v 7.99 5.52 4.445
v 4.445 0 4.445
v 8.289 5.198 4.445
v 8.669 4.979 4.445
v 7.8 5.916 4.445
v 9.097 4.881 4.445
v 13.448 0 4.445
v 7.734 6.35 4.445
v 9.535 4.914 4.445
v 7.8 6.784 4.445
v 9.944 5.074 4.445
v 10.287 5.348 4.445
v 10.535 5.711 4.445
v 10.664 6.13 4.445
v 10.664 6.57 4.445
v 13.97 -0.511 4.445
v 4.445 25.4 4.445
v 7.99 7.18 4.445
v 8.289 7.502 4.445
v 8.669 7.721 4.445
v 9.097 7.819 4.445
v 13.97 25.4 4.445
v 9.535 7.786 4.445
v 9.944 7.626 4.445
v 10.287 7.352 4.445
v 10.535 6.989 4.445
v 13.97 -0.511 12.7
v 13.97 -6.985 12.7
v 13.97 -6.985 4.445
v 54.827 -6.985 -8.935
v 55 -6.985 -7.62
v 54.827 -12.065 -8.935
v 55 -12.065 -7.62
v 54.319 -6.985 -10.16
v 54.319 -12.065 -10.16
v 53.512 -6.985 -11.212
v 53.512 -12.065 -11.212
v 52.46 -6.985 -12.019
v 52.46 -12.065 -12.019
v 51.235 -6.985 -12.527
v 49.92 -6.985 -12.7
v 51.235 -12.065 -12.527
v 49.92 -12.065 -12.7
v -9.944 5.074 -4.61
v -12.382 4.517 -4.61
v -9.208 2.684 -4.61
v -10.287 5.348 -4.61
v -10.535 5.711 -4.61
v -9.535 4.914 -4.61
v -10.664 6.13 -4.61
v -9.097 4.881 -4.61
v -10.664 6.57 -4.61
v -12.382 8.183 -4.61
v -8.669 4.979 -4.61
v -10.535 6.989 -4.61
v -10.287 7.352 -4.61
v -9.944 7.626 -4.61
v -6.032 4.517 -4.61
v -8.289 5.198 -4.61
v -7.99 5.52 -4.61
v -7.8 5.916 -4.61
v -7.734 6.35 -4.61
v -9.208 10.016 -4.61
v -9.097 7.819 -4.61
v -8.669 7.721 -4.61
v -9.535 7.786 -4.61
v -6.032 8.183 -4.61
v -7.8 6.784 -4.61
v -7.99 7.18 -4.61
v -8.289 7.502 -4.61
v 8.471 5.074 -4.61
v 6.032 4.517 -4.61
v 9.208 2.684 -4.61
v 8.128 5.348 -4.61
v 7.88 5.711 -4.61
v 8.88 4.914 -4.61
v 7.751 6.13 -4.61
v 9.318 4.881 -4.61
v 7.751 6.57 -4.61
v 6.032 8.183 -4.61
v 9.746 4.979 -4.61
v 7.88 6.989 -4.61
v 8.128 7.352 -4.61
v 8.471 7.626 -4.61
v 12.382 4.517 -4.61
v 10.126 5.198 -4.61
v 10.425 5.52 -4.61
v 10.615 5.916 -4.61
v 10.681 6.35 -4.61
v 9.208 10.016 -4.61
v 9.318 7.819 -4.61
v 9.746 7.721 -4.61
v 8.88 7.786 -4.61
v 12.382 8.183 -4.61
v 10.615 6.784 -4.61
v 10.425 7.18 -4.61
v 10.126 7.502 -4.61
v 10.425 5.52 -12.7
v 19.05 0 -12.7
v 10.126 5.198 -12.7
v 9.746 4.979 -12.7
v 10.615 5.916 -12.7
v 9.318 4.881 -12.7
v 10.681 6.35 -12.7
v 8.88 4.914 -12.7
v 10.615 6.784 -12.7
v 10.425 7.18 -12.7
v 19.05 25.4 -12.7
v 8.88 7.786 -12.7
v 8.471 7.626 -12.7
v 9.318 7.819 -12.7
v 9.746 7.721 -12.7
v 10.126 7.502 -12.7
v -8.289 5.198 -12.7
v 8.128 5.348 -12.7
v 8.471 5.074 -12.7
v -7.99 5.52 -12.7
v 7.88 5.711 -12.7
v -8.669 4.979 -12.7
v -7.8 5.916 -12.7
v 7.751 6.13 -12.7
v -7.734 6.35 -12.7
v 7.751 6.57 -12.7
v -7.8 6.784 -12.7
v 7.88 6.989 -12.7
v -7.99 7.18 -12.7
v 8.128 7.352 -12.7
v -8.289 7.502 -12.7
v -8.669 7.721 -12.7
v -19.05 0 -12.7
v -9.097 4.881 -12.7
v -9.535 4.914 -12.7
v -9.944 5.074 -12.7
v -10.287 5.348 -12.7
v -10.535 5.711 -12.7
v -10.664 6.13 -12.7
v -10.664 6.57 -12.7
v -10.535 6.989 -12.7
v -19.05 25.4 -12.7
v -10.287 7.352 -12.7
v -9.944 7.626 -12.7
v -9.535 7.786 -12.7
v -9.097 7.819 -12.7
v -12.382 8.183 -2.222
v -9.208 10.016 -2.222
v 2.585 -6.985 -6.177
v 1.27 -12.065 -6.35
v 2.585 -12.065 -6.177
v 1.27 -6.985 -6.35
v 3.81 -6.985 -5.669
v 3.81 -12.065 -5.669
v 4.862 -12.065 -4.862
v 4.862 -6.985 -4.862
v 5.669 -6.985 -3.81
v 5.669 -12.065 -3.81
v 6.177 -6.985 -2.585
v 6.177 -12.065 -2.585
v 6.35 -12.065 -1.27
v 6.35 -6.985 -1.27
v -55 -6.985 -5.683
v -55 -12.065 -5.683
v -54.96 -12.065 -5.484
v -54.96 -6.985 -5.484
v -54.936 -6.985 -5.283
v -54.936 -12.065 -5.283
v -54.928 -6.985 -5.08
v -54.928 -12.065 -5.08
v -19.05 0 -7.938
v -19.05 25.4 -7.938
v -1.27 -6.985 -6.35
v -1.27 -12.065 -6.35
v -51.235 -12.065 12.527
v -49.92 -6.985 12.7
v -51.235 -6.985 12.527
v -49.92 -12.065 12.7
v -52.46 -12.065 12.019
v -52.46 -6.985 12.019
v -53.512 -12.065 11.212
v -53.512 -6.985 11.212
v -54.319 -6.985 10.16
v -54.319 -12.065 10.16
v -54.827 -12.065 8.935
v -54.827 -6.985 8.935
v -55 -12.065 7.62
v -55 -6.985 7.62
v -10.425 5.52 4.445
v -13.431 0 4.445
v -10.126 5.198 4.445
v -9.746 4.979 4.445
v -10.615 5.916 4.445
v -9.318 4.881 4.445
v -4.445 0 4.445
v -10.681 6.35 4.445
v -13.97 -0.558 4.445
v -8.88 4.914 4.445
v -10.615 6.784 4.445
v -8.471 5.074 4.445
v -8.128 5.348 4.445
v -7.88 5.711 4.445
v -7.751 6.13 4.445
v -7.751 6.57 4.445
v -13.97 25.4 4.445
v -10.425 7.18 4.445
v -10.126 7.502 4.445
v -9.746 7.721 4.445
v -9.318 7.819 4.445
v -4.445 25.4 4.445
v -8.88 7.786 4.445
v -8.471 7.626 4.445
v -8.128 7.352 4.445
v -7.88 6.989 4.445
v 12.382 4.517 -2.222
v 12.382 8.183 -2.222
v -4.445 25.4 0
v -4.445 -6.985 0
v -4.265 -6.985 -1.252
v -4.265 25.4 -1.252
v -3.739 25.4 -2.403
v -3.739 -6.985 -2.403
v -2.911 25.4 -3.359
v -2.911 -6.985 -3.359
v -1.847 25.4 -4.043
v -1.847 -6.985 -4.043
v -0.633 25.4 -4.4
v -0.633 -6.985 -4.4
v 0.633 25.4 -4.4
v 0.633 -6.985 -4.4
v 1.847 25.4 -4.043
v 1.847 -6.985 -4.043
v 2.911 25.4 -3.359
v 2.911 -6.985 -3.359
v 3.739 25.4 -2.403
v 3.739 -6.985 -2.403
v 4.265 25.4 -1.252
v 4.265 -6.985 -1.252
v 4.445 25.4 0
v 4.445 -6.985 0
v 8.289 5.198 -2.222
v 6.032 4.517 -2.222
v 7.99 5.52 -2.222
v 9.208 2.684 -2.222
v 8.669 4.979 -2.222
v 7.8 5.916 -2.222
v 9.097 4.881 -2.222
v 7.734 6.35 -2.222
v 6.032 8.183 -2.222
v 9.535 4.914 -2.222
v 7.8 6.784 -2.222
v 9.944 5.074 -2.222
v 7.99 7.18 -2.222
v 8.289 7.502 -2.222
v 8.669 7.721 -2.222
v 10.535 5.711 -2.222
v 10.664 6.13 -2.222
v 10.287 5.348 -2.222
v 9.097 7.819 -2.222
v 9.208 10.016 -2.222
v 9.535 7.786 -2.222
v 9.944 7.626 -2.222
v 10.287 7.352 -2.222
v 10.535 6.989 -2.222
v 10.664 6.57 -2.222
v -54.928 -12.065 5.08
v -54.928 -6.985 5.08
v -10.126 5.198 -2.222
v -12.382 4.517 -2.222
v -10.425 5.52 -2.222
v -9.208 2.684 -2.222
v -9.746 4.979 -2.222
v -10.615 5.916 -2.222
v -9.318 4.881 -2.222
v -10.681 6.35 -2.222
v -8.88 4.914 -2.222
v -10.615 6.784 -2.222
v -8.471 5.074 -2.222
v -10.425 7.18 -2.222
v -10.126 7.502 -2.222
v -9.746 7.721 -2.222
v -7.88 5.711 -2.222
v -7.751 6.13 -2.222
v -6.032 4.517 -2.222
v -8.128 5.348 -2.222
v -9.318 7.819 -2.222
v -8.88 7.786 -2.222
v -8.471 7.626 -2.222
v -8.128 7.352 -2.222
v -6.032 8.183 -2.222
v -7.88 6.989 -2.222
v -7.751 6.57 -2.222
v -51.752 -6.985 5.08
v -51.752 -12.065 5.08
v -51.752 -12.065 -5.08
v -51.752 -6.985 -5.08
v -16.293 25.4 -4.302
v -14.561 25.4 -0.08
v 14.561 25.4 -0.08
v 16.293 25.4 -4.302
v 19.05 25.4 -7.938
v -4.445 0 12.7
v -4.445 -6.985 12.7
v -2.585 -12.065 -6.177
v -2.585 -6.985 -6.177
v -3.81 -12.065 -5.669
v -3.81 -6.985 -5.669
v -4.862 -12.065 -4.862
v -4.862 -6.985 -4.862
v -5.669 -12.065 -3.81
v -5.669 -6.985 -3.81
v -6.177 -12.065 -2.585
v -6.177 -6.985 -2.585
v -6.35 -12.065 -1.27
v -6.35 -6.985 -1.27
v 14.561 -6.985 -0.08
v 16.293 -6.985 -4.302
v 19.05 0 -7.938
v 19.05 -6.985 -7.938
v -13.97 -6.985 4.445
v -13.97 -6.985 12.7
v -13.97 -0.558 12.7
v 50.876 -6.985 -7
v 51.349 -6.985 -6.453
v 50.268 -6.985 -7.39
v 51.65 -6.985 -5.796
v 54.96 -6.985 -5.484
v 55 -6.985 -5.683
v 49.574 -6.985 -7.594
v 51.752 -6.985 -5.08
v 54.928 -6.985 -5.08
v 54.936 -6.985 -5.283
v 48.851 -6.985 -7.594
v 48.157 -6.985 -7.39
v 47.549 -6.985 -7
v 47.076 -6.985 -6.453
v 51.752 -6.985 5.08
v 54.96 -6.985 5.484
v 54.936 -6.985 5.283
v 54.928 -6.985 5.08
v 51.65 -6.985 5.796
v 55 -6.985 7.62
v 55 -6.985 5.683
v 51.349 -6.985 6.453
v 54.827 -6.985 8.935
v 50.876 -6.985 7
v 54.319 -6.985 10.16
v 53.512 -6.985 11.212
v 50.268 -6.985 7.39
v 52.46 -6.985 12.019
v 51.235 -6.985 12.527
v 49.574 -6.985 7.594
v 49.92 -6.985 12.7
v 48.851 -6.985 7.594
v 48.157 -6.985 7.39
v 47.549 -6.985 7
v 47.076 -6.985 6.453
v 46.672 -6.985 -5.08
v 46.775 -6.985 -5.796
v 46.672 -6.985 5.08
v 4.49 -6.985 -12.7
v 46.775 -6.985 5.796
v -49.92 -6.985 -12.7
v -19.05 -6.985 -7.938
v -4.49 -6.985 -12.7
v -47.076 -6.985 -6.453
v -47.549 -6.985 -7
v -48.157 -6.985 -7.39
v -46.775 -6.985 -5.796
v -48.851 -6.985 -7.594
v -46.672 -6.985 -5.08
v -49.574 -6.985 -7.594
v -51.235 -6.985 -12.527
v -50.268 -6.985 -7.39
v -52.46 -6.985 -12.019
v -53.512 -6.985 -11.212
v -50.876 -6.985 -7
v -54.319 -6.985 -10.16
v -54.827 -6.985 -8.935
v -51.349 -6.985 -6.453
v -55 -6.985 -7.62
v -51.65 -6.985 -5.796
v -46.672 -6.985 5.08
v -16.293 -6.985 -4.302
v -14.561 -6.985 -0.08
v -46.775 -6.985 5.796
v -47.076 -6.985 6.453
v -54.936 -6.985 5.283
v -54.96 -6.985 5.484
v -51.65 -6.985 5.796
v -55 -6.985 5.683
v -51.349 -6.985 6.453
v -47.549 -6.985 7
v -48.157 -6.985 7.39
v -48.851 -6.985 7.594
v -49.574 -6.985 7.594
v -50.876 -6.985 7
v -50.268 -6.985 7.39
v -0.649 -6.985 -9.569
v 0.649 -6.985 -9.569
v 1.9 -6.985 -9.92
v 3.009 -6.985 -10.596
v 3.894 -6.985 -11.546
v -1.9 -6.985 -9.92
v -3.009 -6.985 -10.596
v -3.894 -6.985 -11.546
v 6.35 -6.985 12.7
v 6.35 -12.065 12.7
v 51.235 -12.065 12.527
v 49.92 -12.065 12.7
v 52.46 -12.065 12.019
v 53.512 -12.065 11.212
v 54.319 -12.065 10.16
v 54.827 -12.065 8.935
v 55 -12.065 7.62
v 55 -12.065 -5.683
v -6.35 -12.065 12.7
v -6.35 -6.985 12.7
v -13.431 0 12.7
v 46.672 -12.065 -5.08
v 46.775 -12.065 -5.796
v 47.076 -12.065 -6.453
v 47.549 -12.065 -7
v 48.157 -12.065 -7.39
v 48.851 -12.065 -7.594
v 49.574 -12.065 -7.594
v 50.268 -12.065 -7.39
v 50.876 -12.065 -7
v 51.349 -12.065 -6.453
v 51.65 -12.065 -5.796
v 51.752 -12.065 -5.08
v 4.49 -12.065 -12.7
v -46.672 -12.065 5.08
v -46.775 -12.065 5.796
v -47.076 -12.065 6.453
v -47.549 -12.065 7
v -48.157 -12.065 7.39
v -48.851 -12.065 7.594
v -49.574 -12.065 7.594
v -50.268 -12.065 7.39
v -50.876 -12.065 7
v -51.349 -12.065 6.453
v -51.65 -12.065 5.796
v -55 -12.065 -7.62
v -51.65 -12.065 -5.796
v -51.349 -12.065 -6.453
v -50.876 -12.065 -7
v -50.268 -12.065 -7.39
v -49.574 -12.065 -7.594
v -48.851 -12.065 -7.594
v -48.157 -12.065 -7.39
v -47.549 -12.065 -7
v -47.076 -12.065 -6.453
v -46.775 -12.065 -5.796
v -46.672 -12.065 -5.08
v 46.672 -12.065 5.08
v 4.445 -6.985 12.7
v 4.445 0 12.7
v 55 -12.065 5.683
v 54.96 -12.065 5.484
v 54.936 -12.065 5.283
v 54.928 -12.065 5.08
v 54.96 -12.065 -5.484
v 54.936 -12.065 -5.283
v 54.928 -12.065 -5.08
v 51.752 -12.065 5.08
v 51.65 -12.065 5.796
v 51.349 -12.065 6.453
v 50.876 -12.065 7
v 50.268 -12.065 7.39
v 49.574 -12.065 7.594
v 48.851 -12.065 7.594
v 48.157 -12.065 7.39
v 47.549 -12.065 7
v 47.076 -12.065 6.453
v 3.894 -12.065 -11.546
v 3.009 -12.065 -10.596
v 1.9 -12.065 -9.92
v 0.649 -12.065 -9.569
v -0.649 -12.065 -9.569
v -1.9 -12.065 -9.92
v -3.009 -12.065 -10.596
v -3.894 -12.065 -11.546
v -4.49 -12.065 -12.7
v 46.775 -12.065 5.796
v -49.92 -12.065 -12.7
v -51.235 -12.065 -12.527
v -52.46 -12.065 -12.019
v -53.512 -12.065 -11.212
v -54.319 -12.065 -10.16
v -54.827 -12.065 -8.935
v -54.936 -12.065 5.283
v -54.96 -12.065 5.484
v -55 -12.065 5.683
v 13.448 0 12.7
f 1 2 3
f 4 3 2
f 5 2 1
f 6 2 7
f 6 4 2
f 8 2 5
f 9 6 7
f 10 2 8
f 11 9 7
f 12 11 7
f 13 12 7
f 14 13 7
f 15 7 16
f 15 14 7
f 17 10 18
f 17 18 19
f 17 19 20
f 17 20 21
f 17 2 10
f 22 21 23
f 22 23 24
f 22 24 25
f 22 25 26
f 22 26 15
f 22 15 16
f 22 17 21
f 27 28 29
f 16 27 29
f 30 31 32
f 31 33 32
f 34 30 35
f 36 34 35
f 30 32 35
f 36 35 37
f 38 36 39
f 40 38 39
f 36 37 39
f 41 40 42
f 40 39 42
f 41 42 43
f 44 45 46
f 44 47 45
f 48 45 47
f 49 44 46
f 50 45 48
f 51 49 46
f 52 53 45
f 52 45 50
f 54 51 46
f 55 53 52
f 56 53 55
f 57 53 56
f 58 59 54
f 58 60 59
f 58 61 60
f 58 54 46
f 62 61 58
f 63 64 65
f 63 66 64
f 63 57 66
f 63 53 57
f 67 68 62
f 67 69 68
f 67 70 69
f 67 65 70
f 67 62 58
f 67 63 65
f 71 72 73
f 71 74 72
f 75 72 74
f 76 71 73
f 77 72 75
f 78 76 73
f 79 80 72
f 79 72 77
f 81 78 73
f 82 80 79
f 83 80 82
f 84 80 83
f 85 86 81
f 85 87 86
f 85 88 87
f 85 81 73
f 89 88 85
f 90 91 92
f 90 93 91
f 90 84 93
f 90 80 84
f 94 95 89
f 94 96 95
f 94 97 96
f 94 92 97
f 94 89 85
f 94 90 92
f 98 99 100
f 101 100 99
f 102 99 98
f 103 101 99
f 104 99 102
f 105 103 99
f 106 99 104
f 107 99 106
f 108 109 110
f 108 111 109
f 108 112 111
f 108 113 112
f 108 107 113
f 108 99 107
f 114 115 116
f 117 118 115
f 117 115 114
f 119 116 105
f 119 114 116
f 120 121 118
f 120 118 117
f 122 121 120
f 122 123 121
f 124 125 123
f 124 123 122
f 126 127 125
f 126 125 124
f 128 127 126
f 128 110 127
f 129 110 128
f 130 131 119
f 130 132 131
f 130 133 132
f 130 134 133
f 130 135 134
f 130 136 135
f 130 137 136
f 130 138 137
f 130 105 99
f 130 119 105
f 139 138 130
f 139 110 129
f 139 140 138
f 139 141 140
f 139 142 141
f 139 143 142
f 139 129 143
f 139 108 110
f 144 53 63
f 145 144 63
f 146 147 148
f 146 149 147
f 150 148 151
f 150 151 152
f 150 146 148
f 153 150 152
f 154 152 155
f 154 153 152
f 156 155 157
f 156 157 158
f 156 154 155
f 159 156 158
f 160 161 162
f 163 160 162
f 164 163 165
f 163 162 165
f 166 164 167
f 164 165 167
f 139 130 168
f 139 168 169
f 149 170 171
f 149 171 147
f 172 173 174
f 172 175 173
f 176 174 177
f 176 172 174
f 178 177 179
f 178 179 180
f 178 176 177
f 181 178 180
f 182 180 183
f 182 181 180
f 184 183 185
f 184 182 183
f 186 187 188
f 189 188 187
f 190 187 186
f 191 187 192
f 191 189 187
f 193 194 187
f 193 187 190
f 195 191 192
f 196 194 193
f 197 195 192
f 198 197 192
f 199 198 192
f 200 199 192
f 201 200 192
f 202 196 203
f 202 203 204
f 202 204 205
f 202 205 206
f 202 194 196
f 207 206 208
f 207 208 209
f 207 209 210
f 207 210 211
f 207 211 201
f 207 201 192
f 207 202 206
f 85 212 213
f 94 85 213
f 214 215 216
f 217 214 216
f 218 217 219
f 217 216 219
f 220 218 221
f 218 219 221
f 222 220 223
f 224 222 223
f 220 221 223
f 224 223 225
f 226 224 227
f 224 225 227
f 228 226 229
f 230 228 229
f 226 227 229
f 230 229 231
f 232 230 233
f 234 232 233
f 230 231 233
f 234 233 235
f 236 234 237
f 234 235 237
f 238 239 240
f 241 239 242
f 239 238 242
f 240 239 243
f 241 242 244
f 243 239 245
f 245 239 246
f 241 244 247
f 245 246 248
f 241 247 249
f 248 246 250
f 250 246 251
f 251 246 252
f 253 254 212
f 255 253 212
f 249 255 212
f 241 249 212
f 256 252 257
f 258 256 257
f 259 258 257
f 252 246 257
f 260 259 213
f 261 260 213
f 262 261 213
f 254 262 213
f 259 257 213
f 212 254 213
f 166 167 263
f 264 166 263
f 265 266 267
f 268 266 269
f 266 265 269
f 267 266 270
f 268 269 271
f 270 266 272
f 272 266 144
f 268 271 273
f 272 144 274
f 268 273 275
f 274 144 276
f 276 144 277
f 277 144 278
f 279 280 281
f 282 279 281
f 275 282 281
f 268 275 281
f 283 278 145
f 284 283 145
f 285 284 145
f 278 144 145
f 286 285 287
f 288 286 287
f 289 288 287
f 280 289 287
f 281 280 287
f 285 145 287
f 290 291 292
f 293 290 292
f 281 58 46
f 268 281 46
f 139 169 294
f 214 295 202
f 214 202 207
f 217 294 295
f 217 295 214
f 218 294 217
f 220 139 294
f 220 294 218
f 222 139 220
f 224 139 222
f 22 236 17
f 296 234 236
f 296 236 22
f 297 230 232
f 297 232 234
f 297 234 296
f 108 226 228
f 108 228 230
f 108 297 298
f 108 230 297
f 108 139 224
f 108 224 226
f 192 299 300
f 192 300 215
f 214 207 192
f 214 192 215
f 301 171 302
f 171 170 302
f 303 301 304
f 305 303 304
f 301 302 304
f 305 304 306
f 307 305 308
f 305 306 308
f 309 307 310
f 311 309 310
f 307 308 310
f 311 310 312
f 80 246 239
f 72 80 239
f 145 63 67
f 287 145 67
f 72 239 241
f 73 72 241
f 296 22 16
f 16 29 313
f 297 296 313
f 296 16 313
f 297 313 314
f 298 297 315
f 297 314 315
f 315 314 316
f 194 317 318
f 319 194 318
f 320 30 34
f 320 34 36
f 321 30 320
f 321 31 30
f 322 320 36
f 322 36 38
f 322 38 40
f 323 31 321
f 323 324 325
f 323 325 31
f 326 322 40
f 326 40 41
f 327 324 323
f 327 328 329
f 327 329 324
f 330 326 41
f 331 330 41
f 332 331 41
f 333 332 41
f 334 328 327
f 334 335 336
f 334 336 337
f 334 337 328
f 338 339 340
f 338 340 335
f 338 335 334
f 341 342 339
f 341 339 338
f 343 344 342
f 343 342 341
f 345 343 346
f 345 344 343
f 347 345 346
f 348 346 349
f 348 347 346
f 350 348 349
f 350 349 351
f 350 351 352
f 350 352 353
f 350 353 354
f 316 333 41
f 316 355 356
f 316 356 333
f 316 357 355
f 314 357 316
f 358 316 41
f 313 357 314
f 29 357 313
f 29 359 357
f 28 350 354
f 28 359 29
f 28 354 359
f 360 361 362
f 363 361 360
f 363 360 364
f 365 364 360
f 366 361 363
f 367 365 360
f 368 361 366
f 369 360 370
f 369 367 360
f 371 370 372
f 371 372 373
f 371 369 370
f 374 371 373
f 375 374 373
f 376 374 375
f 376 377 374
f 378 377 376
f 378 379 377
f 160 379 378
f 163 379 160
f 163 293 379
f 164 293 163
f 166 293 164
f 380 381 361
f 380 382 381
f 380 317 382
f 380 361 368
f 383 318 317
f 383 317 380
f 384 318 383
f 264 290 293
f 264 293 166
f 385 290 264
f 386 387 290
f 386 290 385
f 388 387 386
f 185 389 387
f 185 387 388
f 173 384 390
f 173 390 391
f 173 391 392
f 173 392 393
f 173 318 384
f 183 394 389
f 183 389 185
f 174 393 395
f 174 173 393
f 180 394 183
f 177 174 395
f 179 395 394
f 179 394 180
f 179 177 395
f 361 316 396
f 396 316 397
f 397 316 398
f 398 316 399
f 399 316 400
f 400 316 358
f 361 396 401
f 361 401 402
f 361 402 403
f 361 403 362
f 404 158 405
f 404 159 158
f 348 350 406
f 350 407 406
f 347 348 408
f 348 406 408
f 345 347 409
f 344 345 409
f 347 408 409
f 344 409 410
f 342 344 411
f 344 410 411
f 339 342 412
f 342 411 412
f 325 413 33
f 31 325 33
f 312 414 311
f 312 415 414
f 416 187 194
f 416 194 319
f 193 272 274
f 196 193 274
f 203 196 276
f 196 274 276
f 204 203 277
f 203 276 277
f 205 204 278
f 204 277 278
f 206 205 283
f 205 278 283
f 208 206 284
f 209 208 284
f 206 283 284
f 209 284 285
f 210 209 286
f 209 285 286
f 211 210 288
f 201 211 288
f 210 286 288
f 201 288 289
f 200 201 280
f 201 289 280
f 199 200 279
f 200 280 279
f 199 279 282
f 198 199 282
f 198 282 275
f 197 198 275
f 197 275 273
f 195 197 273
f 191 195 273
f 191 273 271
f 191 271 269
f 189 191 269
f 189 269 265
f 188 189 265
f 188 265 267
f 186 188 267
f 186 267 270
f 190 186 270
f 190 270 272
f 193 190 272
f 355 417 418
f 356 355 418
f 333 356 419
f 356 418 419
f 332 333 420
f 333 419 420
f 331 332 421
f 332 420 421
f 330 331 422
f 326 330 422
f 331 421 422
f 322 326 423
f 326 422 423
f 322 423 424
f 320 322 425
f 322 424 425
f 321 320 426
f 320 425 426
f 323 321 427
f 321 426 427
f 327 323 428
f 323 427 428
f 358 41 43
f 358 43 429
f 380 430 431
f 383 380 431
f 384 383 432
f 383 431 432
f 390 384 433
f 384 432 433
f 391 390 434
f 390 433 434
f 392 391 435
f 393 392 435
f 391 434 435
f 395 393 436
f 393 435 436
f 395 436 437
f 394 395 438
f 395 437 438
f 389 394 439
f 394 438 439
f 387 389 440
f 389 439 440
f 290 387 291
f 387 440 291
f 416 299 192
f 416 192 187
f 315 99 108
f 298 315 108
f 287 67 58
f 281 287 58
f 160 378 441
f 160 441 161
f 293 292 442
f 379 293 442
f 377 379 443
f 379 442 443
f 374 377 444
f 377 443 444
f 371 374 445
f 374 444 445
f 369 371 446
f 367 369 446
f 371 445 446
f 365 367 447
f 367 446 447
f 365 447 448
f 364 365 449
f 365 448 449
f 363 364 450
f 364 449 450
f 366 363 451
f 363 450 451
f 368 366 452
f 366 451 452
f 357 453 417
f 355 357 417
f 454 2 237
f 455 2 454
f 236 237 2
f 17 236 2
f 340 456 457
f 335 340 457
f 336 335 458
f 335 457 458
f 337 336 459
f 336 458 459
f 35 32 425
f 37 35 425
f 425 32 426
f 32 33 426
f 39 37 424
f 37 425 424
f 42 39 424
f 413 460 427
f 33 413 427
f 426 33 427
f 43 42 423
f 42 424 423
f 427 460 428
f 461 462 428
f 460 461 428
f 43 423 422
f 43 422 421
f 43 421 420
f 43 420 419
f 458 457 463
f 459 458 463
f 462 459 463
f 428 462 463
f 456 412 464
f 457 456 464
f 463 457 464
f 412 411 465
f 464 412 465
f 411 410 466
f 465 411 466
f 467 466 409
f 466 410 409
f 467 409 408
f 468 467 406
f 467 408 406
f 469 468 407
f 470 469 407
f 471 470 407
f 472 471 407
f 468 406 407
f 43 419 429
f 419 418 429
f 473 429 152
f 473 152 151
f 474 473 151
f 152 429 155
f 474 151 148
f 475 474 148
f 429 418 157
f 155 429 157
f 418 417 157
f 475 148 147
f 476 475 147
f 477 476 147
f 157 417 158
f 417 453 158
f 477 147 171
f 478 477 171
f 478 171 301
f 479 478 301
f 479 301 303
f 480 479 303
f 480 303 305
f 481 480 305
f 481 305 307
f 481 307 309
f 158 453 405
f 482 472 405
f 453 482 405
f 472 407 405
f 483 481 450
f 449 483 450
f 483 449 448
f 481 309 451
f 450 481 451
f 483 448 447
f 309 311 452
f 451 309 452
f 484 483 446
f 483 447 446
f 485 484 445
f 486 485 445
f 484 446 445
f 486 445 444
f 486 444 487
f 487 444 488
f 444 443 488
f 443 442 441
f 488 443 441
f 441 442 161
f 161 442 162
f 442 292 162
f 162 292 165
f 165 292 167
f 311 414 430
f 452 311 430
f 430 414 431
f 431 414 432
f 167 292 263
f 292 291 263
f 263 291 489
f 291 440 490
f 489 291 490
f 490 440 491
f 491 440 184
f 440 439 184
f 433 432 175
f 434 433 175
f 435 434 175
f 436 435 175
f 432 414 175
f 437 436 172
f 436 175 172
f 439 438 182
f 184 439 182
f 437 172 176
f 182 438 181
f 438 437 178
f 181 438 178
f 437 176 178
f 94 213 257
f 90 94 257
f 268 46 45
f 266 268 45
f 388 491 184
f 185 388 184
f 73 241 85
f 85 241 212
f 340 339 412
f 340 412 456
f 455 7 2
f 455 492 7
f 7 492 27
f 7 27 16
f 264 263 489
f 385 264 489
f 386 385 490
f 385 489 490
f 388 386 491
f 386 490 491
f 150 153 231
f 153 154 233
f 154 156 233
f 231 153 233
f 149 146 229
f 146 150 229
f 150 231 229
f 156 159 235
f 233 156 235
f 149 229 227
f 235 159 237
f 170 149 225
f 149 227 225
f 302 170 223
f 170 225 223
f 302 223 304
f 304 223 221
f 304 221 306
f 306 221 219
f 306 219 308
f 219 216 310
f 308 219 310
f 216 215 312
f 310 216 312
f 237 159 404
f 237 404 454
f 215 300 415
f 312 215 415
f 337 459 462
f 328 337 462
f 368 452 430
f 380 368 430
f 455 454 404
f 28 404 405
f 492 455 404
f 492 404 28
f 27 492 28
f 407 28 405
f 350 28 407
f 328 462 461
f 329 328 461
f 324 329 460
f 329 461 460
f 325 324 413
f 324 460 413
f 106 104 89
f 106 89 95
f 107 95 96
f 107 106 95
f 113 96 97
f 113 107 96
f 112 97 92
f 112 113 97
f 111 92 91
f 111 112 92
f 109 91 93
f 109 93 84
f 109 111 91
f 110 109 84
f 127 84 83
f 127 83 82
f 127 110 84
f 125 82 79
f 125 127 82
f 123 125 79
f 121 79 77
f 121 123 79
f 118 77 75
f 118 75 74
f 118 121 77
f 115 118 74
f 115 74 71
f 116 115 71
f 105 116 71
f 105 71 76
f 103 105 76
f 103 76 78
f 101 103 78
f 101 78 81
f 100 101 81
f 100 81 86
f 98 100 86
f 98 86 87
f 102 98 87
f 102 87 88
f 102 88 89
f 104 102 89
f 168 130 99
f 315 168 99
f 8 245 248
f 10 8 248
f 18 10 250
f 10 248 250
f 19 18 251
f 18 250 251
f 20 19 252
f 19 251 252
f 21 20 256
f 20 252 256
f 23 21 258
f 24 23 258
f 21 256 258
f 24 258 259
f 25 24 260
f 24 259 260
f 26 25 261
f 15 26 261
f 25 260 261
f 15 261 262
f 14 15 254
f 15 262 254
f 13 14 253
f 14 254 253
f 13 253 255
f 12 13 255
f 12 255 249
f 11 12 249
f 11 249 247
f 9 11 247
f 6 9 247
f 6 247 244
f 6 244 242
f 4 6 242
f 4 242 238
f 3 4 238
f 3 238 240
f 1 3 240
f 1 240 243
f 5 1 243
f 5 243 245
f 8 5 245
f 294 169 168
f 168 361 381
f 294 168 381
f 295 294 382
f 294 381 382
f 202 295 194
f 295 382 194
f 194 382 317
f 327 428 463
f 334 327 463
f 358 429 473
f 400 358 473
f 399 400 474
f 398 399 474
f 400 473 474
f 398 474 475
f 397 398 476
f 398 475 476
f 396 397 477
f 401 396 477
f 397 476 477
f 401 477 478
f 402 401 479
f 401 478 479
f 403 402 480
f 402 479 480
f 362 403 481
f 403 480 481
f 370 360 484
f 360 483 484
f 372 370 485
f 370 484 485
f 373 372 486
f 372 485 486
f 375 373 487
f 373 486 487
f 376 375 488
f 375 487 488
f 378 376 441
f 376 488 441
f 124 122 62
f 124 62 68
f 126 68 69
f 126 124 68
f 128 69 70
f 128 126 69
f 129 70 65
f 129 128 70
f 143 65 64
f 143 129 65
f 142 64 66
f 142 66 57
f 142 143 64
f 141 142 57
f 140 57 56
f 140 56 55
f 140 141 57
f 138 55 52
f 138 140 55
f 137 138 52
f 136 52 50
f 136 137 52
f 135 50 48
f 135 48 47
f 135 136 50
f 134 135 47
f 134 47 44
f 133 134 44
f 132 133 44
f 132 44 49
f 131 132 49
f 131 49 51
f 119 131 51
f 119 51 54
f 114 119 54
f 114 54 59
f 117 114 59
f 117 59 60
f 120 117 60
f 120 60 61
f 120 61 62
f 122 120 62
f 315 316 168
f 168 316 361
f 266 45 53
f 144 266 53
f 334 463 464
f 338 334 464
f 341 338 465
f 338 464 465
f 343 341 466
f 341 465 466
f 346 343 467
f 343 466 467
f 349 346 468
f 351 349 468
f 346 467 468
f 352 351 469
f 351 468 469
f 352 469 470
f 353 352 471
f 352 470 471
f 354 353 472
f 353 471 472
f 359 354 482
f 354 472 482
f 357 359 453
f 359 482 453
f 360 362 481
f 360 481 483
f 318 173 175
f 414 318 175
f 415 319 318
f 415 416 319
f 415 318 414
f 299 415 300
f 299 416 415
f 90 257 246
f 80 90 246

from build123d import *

# Parameters (mm, degrees)
CUT_EXTRUDE1_START     = -18.415
CUT_EXTRUDE1_OUTLINE_W = 38.1
CUT_EXTRUDE1_OUTLINE_H = 25.4
CUT_EXTRUDE1_DEPTH     = 25.0825
CUT_EXTRUDE1_2_DEPTH   = 16.0274
CUT_EXTRUDE1_3_DEPTH   = 6.6675
CUT_EXTRUDE2_DEPTH     = 2.3876
CUT_EXTRUDE3_DEPTH     = 38.867781903
CUT_EXTRUDE4_DEPTH     = 38.867781903
CUT_EXTRUDE5_DEPTH     = 38.867781903
BOSS_EXTRUDE1_START    = 6.985
BOSS_EXTRUDE1_DEPTH    = 6.985
BOSS_EXTRUDE2_DEPTH    = 5.08
SKETCH8_W              = 19.05
SKETCH8_H              = 5.08
CUT_EXTRUDE6_DEPTH     = 1.905
SKETCH9_W              = 19.05
SKETCH9_H              = 5.08
CUT_EXTRUDE7_DEPTH     = 1.905
CUT_EXTRUDE8_REACH     = 71.674
CUT_EXTRUDE9_REACH     = 71.674
CUT_EXTRUDE10_REACH    = 71.674
CUT_EXTRUDE11_REACH    = 71.674
CUT_EXTRUDE12_REACH    = 71.674
SKETCH15_W             = 1.4732
SKETCH15_H             = 16.0274
SKETCH16_W             = 1.4732
SKETCH16_H             = 16.0274
M2_5_CLEARANCE_HOLE1_D = 2.9464
FILLET1_R              = 5.08
CHAMFER2_SIZE          = 0.511100582
CHAMFER2_SIZE2         = 0.522104304
CHAMFER3_SIZE          = 0.558247665
CHAMFER3_SIZE2         = 0.538663646
SKETCH27_W             = 38.1
SKETCH27_H             = 25.4
CUT_EXTRUDE13_DEPTH    = 7.9375


with BuildPart() as part:
    # Cut-Extrude1: read off the stored shape, not the designer's step
    # Cut-Extrude1 outline → Cut-Extrude1 (new body)
    with BuildSketch(Plane.XY.offset(-2.2225).offset(CUT_EXTRUDE1_START)):
        with Locations((0, 12.7)):
            Rectangle(CUT_EXTRUDE1_OUTLINE_W, CUT_EXTRUDE1_OUTLINE_H)
        Polygon((-6.0325, 8.183087105), (-6.0325, 4.516912895), (-9.2075, 2.683825791), (-12.3825, 4.516912895), (-12.3825, 8.183087105), (-9.2075, 10.016174209), align=None, mode=Mode.SUBTRACT)
    extrude(amount=CUT_EXTRUDE1_DEPTH)

    # Cut-Extrude1 2 outline → Cut-Extrude1 2 (add)
    with BuildSketch(Plane.XY.offset(-2.2225).offset(CUT_EXTRUDE1_START)):
        Polygon((-9.2075, 2.683825791), (-6.0325, 4.516912895), (-6.0325, 8.183087105), (-9.2075, 10.016174209), (-12.3825, 8.183087105), (-12.3825, 4.516912895), align=None)
    extrude(amount=CUT_EXTRUDE1_2_DEPTH)

    # Cut-Extrude1 3 outline → Cut-Extrude1 3 (add)
    with BuildSketch(Plane.XY.offset(-2.2225)):
        Polygon((-9.2075, 2.683825791), (-6.0325, 4.516912895), (-6.0325, 8.183087105), (-9.2075, 10.016174209), (-12.3825, 8.183087105), (-12.3825, 4.516912895), align=None)
    extrude(amount=CUT_EXTRUDE1_3_DEPTH)

    # Sketch2 → Cut-Extrude2 (cut)
    with BuildSketch(Plane.XY.offset(-2.2225)):
        Polygon((6.0325, 8.183087105), (6.0325, 4.516912895), (9.2075, 2.683825791), (12.3825, 4.516912895), (12.3825, 8.183087105), (9.2075, 10.016174209), align=None)
    extrude(amount=-CUT_EXTRUDE2_DEPTH, mode=Mode.SUBTRACT)

    # Sketch3 → Cut-Extrude3 (cut, through all)
    with BuildSketch(Plane.XZ):
        with BuildLine():
            Line((-13.97, 4.445), (-19.05, 4.445))
            Line((-19.05, 4.445), (-19.05, -7.9375))
            ThreePointArc((-19.05, -7.9375), (-15.289364951, -2.247023353), (-13.97, 4.445))
        make_face()
    extrude(amount=-CUT_EXTRUDE3_DEPTH, mode=Mode.SUBTRACT)

    # Sketch4 → Cut-Extrude4 (cut, through all)
    with BuildSketch(Plane.XZ):
        with BuildLine():
            Line((4.445, 4.445), (-4.445, 4.445))
            Line((-4.445, 4.445), (-4.445, 0))
            ThreePointArc((-4.445, 0), (0, -4.445), (4.445, 0))
            Line((4.445, 0), (4.445, 4.445))
        make_face()
    extrude(amount=-CUT_EXTRUDE4_DEPTH, mode=Mode.SUBTRACT)

    # Sketch5 → Cut-Extrude5 (cut, through all)
    with BuildSketch(Plane.XZ):
        with BuildLine():
            Line((19.05, -7.9375), (19.05, 4.445))
            Line((19.05, 4.445), (13.97, 4.445))
            ThreePointArc((13.97, 4.445), (15.289364951, -2.247023353), (19.05, -7.9375))
        make_face()
    extrude(amount=-CUT_EXTRUDE5_DEPTH, mode=Mode.SUBTRACT)

    # Sketch6 → Boss-Extrude1 (add)
    with BuildSketch(Plane.XZ.offset(BOSS_EXTRUDE1_START)):
        with BuildLine():
            Line((4.445, 0), (4.445, 12.7))
            Line((4.445, 12.7), (13.97, 12.7))
            Line((13.97, 12.7), (13.97, 4.445))
            ThreePointArc((13.97, 4.445), (15.289364951, -2.247023353), (19.05, -7.9375))
            Line((19.05, -7.9375), (-19.05, -7.9375))
            ThreePointArc((-19.05, -7.9375), (-15.289364951, -2.247023353), (-13.97, 4.445))
            Line((-13.97, 4.445), (-13.97, 12.7))
            Line((-13.97, 12.7), (-4.445, 12.7))
            Line((-4.445, 12.7), (-4.445, 0))
            ThreePointArc((-4.445, 0), (0, -4.445), (4.445, 0))
        make_face()
    extrude(amount=-BOSS_EXTRUDE1_DEPTH)

    # Sketch7 → Boss-Extrude2 (add)
    with BuildSketch(Plane.XZ.offset(6.985)):
        Polygon((-4.445, -6.35), (4.445, -6.35), (4.445, 12.7), (55, 12.7), (55, -12.7), (-55, -12.7), (-55, 12.7), (-4.445, 12.7), align=None)
    extrude(amount=BOSS_EXTRUDE2_DEPTH)

    # Sketch8 → Cut-Extrude6 (cut)
    with BuildSketch(Plane.ZY.offset(-4.445)):
        with Locations((3.175, -9.525)):
            Rectangle(SKETCH8_W, SKETCH8_H)
    extrude(amount=-CUT_EXTRUDE6_DEPTH, mode=Mode.SUBTRACT)

    # Sketch9 → Cut-Extrude7 (cut)
    with BuildSketch(Plane(origin=(-4.445, 0, 0), x_dir=(0, 0, -1), z_dir=(1, 0, 0))):
        with Locations((-3.175, -9.525)):
            Rectangle(SKETCH9_W, SKETCH9_H)
    extrude(amount=-CUT_EXTRUDE7_DEPTH, mode=Mode.SUBTRACT)

    # Sketch10 → Cut-Extrude8 (cut, up to next)
    with BuildSketch(Plane.XZ.offset(12.065), mode=Mode.PRIVATE) as cut_extrude8_sk1:
        with BuildLine():
            Line((-4.490128061, -12.7), (4.490128061, -12.7))
            ThreePointArc((4.490128061, -12.7), (0, -9.525), (-4.490128061, -12.7))
        make_face()
    cut_extrude8_tool1 = extrude(cut_extrude8_sk1.sketch, amount=-CUT_EXTRUDE8_REACH, mode=Mode.PRIVATE) & part.part
    add(cut_extrude8_tool1.solids().sort_by_distance((0, -12.065, -11.384864))[0], mode=Mode.SUBTRACT)

    # Sketch11 → Cut-Extrude9 (cut, up to next)
    with BuildSketch(Plane.XZ.offset(12.065), mode=Mode.PRIVATE) as cut_extrude9_sk1:
        with BuildLine():
            Line((60.0075, -5.08), (60.0075, 5.08))
            ThreePointArc((60.0075, 5.08), (57.4675, 7.62), (54.9275, 5.08))
            Line((54.9275, 5.08), (54.9275, -5.08))
            ThreePointArc((54.9275, -5.08), (57.4675, -7.62), (60.0075, -5.08))
        make_face()
    cut_extrude9_tool1 = extrude(cut_extrude9_sk1.sketch, amount=-CUT_EXTRUDE9_REACH, mode=Mode.PRIVATE) & part.part
    add(cut_extrude9_tool1.solids().sort_by_distance((57.4675, -12.065, 0))[0], mode=Mode.SUBTRACT)

    # Sketch12 → Cut-Extrude10 (cut, up to next)
    with BuildSketch(Plane.XZ.offset(12.065), mode=Mode.PRIVATE) as cut_extrude10_sk1:
        with BuildLine():
            Line((51.7525, -5.08), (51.7525, 5.08))
            ThreePointArc((51.7525, 5.08), (49.2125, 7.62), (46.6725, 5.08))
            Line((46.6725, 5.08), (46.6725, -5.08))
            ThreePointArc((46.6725, -5.08), (49.2125, -7.62), (51.7525, -5.08))
        make_face()
    cut_extrude10_tool1 = extrude(cut_extrude10_sk1.sketch, amount=-CUT_EXTRUDE10_REACH, mode=Mode.PRIVATE) & part.part
    add(cut_extrude10_tool1.solids().sort_by_distance((49.2125, -12.065, 0))[0], mode=Mode.SUBTRACT)

    # Sketch13 → Cut-Extrude11 (cut, up to next)
    with BuildSketch(Plane.XZ.offset(12.065), mode=Mode.PRIVATE) as cut_extrude11_sk1:
        with BuildLine():
            Line((-46.6725, -5.08), (-46.6725, 5.08))
            ThreePointArc((-46.6725, 5.08), (-49.2125, 7.62), (-51.7525, 5.08))
            Line((-51.7525, 5.08), (-51.7525, -5.08))
            ThreePointArc((-51.7525, -5.08), (-49.2125, -7.62), (-46.6725, -5.08))
        make_face()
    cut_extrude11_tool1 = extrude(cut_extrude11_sk1.sketch, amount=-CUT_EXTRUDE11_REACH, mode=Mode.PRIVATE) & part.part
    add(cut_extrude11_tool1.solids().sort_by_distance((-49.2125, -12.065, 0))[0], mode=Mode.SUBTRACT)

    # Sketch14 → Cut-Extrude12 (cut, up to next)
    with BuildSketch(Plane.XZ.offset(12.065), mode=Mode.PRIVATE) as cut_extrude12_sk1:
        with BuildLine():
            Line((-54.9275, -5.08), (-54.9275, 5.08))
            ThreePointArc((-54.9275, 5.08), (-57.4675, 7.62), (-60.0075, 5.08))
            Line((-60.0075, 5.08), (-60.0075, -5.08))
            ThreePointArc((-60.0075, -5.08), (-57.4675, -7.62), (-54.9275, -5.08))
        make_face()
    cut_extrude12_tool1 = extrude(cut_extrude12_sk1.sketch, amount=-CUT_EXTRUDE12_REACH, mode=Mode.PRIVATE) & part.part
    add(cut_extrude12_tool1.solids().sort_by_distance((-57.4675, -12.065, 0))[0], mode=Mode.SUBTRACT)

    # Sketch15 → Cut-Revolve1 (revolve, cut)
    with BuildSketch(Plane(origin=(0, 6.35, 0), x_dir=(1, 0, 0), z_dir=(0, 1, 0))):
        with Locations((-8.4709, 12.6238)):
            Rectangle(SKETCH15_W, SKETCH15_H)
    revolve(axis=Axis((-9.2075, 6.35, -20.6375), (0, 0, 1)), mode=Mode.SUBTRACT)

    # Sketch16 → Cut-Revolve2 (revolve, cut)
    with BuildSketch(Plane(origin=(0, 6.35, 0), x_dir=(1, 0, 0), z_dir=(0, 1, 0))):
        with Locations((9.9441, 12.6238)):
            Rectangle(SKETCH16_W, SKETCH16_H)
    revolve(axis=Axis((9.2075, 6.35, -20.6375), (0, 0, 1)), mode=Mode.SUBTRACT)

    # M2.5 Clearance Hole1 (through all)
    with Locations(Plane.XY.offset(4.445)):
        with Locations((9.2075, 6.35), (-9.2075, 6.35)):
            Hole(M2_5_CLEARANCE_HOLE1_D / 2)

    # Fillet1
    fillet1_edges = [part.edges().sort_by_distance(p)[0] for p in [
        (-55, -9.525, 12.7),
        (-55, -9.525, -12.7),
        (55, -9.525, -12.7),
        (55, -9.525, 12.7),
        (6.35, -9.525, -6.35),
        (-6.35, -9.525, -6.35),
    ]]
    fillet(fillet1_edges, radius=FILLET1_R)

    # Chamfer2
    chamfer2_edges = [part.edges().sort_by_distance(p)[0] for p in [
        (13.97, 0, 8.5725),
    ]]
    chamfer2_side = [part.faces().sort_by_distance(p)[0] for p in [
        (13.97, -3.4925, 8.5725),
    ]]
    chamfer(chamfer2_edges, length=CHAMFER2_SIZE, length2=CHAMFER2_SIZE2, reference=chamfer2_side[0])

    # Chamfer3
    chamfer3_edges = [part.edges().sort_by_distance(p)[0] for p in [
        (-13.97, 0, 8.5725),
    ]]
    chamfer3_side = [part.faces().sort_by_distance(p)[0] for p in [
        (-13.97, -3.4925, 8.5725),
    ]]
    chamfer(chamfer3_edges, length=CHAMFER3_SIZE, length2=CHAMFER3_SIZE2, reference=chamfer3_side[0])

    # Sketch27 → Cut-Extrude13 (cut)
    with BuildSketch(Plane(origin=(0, 0, -20.6375), x_dir=(-1, 0, 0), z_dir=(0, 0, -1))):
        with Locations((0, 12.7)):
            Rectangle(SKETCH27_W, SKETCH27_H)
    extrude(amount=-CUT_EXTRUDE13_DEPTH, mode=Mode.SUBTRACT)


solid = part.part
